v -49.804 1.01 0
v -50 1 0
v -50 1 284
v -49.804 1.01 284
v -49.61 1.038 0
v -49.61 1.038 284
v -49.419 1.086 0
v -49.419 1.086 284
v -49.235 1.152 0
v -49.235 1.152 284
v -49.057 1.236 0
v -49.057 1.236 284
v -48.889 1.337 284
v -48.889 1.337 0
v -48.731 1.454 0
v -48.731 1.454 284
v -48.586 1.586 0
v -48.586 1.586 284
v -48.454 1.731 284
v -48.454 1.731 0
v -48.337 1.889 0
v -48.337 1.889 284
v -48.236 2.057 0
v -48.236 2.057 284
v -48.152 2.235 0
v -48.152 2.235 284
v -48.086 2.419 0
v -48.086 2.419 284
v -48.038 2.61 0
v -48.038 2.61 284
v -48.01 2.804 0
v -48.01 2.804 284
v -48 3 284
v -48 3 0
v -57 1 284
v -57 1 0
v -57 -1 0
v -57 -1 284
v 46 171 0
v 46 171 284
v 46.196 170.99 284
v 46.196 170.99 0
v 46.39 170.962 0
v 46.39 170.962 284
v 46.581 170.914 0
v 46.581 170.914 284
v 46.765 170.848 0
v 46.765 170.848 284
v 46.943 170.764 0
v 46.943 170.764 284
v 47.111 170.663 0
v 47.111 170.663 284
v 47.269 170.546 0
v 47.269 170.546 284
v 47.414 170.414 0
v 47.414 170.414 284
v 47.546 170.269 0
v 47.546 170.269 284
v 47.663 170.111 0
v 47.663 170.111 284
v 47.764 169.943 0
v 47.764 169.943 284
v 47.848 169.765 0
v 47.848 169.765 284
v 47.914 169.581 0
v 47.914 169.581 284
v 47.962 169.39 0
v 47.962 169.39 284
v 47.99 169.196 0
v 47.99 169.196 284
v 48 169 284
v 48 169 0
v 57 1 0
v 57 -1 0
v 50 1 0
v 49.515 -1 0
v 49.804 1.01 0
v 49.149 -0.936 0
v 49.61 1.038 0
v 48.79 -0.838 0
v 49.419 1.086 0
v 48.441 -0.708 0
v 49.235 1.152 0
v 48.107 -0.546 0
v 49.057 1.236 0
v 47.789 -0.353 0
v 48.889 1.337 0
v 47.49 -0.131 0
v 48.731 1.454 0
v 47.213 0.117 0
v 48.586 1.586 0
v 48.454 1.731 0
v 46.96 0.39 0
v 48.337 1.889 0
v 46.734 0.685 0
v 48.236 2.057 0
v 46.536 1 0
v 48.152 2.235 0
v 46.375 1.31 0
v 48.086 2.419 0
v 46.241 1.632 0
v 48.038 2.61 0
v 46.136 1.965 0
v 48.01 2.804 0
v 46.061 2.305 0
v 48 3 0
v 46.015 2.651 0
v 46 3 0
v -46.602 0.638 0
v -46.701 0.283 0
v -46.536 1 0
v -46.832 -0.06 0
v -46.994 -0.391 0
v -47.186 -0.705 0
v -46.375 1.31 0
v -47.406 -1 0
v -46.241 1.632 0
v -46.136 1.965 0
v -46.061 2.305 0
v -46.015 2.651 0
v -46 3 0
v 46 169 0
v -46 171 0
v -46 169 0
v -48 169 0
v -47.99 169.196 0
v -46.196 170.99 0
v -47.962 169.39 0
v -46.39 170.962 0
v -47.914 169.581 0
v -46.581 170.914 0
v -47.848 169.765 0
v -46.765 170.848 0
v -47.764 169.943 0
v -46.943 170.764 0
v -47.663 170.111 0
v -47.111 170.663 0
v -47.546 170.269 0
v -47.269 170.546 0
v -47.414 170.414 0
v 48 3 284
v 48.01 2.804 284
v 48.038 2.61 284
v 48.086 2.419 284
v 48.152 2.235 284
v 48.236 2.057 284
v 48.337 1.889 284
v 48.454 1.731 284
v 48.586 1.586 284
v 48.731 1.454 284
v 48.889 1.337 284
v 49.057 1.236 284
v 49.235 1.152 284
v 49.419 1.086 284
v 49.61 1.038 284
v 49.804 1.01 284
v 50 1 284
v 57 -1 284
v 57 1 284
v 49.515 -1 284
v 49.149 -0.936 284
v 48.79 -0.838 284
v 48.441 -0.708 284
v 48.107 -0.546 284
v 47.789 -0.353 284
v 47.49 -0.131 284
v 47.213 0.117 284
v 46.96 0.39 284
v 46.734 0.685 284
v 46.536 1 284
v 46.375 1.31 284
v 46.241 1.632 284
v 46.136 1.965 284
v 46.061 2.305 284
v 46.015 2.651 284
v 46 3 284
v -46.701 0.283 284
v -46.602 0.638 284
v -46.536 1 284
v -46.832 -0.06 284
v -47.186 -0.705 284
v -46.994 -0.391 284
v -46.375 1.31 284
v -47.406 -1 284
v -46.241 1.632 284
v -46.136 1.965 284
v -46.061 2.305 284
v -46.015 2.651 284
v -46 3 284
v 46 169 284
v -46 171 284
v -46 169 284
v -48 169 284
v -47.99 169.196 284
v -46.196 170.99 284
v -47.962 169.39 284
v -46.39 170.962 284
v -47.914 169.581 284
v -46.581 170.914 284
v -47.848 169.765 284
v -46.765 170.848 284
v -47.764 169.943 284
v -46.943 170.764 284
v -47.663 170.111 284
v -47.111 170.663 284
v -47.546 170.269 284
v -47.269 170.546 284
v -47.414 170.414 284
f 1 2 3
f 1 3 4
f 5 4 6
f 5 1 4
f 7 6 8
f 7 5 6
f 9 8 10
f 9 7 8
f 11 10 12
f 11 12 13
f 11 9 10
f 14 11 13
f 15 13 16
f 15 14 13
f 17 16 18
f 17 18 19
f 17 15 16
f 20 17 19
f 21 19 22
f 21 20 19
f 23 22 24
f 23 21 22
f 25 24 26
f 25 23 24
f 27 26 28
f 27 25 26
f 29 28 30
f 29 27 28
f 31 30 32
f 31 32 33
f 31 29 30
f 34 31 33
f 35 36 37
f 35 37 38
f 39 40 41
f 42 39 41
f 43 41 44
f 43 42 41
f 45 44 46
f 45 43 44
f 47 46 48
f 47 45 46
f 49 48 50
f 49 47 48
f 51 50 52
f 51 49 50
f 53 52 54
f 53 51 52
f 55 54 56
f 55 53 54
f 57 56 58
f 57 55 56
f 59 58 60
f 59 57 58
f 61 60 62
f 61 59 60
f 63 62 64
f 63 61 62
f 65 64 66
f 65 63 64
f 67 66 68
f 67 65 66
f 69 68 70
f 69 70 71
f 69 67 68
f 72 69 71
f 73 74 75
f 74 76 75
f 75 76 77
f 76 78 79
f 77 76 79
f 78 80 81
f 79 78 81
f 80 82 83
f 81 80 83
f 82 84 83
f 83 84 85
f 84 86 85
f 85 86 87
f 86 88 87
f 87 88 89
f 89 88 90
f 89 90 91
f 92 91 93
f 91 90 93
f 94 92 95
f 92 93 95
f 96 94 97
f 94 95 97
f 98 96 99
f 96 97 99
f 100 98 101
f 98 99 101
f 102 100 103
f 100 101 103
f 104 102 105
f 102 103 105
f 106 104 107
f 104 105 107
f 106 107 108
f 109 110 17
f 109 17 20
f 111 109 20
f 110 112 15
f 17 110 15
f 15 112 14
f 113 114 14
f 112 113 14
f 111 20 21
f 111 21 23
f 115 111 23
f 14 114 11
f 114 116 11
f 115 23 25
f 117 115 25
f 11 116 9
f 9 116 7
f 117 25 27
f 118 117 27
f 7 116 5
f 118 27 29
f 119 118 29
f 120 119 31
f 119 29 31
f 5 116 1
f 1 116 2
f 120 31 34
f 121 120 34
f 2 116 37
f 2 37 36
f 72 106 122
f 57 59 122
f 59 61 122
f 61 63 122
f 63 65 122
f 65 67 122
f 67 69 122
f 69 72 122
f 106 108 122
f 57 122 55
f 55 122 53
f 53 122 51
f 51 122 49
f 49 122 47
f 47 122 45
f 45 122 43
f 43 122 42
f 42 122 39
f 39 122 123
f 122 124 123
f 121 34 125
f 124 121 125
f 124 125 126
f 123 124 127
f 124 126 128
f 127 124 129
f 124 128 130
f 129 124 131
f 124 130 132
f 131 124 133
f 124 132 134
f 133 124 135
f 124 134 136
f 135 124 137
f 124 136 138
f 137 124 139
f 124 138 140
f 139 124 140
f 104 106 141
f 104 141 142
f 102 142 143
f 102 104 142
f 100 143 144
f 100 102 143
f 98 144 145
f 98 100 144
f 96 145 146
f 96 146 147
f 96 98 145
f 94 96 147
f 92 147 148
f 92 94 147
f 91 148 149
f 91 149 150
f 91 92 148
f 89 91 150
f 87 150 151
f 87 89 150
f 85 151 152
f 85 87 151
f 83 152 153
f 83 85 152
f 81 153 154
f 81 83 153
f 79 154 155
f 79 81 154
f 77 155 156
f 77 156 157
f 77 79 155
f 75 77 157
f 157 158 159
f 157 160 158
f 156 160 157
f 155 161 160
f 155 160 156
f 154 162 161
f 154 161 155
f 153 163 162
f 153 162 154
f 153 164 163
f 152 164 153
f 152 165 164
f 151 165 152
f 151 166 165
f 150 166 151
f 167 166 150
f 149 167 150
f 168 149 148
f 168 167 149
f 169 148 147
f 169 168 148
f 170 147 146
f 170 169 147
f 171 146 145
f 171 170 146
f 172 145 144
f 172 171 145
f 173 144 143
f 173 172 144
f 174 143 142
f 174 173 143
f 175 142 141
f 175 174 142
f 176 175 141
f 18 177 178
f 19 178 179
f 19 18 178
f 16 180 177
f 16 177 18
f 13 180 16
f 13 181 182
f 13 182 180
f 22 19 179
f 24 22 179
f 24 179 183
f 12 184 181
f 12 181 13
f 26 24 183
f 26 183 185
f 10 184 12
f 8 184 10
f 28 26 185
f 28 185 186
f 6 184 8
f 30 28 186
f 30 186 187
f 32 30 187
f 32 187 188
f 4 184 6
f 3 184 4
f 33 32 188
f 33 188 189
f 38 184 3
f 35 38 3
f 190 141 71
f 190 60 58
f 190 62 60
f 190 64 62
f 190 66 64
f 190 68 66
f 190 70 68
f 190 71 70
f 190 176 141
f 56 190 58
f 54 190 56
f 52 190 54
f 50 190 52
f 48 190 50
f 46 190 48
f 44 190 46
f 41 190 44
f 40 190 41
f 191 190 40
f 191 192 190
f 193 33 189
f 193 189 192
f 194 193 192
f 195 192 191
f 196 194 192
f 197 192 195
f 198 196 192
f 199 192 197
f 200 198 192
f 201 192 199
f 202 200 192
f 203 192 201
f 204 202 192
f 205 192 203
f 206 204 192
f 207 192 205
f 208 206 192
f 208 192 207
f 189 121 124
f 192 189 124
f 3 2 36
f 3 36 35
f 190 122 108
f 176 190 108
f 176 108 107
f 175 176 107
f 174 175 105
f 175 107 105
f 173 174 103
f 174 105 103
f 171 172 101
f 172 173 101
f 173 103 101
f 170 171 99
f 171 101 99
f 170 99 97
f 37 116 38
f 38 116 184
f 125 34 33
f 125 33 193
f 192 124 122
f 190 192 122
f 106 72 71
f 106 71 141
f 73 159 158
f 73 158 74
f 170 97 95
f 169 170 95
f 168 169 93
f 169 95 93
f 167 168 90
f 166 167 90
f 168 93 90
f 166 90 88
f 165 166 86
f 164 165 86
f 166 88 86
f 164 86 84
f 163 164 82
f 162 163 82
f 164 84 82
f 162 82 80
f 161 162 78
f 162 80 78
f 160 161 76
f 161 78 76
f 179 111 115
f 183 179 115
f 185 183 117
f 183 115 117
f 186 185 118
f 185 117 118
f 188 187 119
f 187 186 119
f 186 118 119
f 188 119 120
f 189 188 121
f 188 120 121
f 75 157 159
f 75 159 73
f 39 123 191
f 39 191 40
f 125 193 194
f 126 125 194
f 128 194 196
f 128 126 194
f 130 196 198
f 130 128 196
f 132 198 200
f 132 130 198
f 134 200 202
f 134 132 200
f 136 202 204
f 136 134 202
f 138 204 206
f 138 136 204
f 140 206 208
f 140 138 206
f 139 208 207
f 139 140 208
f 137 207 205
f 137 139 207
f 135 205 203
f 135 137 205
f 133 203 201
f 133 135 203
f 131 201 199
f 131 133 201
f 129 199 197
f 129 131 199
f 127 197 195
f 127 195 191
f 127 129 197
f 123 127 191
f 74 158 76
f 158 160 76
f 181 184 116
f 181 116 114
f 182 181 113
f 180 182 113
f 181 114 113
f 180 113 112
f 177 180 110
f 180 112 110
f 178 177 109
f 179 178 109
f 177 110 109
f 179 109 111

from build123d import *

# Parameters (mm, degrees)
BOSS_EXTRUDE1_DEPTH = 284
CUT_EXTRUDE1_DEPTH  = 336.560724758
CUT_EXTRUDE3_DEPTH  = 284
SKETCH5_W           = 284
SKETCH5_H           = 2
BOSS_EXTRUDE2_DEPTH = 5
SKETCH6_W           = 284
SKETCH6_H           = 2
BOSS_EXTRUDE3_DEPTH = 5


with BuildPart() as part:
    # Sketch1 → Boss-Extrude1 (new body)
    with BuildSketch(Plane.XY):
        with BuildLine():
            Line((50, 1), (52, 1))
            Line((52, 1), (52, -1))
            Line((52, -1), (-52, -1))
            Line((-52, -1), (-52, 1))
            Line((-52, 1), (-50, 1))
            ThreePointArc((-50, 1), (-48.585786438, 1.585786438), (-48, 3))
            Line((-48, 3), (-48, 169))
            ThreePointArc((-48, 169), (-47.414213562, 170.414213562), (-46, 171))
            Line((-46, 171), (46, 171))
            ThreePointArc((46, 171), (47.414213562, 170.414213562), (48, 169))
            Line((48, 169), (48, 3))
            ThreePointArc((48, 3), (48.585786438, 1.585786438), (50, 1))
        make_face()
    extrude(amount=BOSS_EXTRUDE1_DEPTH)

    # Sketch2 → Cut-Extrude1 (cut, through all)
    with BuildSketch(Plane(origin=(0, 0, 0), x_dir=(-1, 0, 0), z_dir=(0, 0, -1))):
        with BuildLine():
            Line((-46.535898385, 1), (46.535898385, 1))
            ThreePointArc((46.535898385, 1), (46.136296695, 1.96472382), (46, 3))
            Line((46, 3), (46, 169))
            Line((46, 169), (-46, 169))
            Line((-46, 169), (-46, 3))
            ThreePointArc((-46, 3), (-46.136296695, 1.96472382), (-46.535898385, 1))
        make_face()
    extrude(amount=-CUT_EXTRUDE1_DEPTH, mode=Mode.SUBTRACT)

    # Sketch3 → Cut-Extrude3 (cut)
    with BuildSketch(Plane(origin=(0, 0, 0), x_dir=(-1, 0, 0), z_dir=(0, 0, -1))):
        with BuildLine():
            Line((-50.018137883, -1.031749995), (49.461412471, -2.32808526))
            ThreePointArc((49.461412471, -2.32808526), (47.495708501, -1.106152193), (46.535898385, 1))
            Line((46.535898385, 1), (-46.535898385, 1))
            ThreePointArc((-46.535898385, 1), (-48.002325394, -0.486674019), (-50.018137883, -1.031749995))
        make_face()
    extrude(amount=-CUT_EXTRUDE3_DEPTH, mode=Mode.SUBTRACT)

    # Sketch5 → Boss-Extrude2 (add)
    with BuildSketch(Plane.ZY.offset(52)):
        with Locations((142, 0)):
            Rectangle(SKETCH5_W, SKETCH5_H)
    extrude(amount=BOSS_EXTRUDE2_DEPTH)

    # Sketch6 → Boss-Extrude3 (add)
    with BuildSketch(Plane(origin=(52, 0, 0), x_dir=(0, 0, -1), z_dir=(1, 0, 0))):
        with Locations((-142, 0)):
            Rectangle(SKETCH6_W, SKETCH6_H)
    extrude(amount=BOSS_EXTRUDE3_DEPTH)


solid = part.part
